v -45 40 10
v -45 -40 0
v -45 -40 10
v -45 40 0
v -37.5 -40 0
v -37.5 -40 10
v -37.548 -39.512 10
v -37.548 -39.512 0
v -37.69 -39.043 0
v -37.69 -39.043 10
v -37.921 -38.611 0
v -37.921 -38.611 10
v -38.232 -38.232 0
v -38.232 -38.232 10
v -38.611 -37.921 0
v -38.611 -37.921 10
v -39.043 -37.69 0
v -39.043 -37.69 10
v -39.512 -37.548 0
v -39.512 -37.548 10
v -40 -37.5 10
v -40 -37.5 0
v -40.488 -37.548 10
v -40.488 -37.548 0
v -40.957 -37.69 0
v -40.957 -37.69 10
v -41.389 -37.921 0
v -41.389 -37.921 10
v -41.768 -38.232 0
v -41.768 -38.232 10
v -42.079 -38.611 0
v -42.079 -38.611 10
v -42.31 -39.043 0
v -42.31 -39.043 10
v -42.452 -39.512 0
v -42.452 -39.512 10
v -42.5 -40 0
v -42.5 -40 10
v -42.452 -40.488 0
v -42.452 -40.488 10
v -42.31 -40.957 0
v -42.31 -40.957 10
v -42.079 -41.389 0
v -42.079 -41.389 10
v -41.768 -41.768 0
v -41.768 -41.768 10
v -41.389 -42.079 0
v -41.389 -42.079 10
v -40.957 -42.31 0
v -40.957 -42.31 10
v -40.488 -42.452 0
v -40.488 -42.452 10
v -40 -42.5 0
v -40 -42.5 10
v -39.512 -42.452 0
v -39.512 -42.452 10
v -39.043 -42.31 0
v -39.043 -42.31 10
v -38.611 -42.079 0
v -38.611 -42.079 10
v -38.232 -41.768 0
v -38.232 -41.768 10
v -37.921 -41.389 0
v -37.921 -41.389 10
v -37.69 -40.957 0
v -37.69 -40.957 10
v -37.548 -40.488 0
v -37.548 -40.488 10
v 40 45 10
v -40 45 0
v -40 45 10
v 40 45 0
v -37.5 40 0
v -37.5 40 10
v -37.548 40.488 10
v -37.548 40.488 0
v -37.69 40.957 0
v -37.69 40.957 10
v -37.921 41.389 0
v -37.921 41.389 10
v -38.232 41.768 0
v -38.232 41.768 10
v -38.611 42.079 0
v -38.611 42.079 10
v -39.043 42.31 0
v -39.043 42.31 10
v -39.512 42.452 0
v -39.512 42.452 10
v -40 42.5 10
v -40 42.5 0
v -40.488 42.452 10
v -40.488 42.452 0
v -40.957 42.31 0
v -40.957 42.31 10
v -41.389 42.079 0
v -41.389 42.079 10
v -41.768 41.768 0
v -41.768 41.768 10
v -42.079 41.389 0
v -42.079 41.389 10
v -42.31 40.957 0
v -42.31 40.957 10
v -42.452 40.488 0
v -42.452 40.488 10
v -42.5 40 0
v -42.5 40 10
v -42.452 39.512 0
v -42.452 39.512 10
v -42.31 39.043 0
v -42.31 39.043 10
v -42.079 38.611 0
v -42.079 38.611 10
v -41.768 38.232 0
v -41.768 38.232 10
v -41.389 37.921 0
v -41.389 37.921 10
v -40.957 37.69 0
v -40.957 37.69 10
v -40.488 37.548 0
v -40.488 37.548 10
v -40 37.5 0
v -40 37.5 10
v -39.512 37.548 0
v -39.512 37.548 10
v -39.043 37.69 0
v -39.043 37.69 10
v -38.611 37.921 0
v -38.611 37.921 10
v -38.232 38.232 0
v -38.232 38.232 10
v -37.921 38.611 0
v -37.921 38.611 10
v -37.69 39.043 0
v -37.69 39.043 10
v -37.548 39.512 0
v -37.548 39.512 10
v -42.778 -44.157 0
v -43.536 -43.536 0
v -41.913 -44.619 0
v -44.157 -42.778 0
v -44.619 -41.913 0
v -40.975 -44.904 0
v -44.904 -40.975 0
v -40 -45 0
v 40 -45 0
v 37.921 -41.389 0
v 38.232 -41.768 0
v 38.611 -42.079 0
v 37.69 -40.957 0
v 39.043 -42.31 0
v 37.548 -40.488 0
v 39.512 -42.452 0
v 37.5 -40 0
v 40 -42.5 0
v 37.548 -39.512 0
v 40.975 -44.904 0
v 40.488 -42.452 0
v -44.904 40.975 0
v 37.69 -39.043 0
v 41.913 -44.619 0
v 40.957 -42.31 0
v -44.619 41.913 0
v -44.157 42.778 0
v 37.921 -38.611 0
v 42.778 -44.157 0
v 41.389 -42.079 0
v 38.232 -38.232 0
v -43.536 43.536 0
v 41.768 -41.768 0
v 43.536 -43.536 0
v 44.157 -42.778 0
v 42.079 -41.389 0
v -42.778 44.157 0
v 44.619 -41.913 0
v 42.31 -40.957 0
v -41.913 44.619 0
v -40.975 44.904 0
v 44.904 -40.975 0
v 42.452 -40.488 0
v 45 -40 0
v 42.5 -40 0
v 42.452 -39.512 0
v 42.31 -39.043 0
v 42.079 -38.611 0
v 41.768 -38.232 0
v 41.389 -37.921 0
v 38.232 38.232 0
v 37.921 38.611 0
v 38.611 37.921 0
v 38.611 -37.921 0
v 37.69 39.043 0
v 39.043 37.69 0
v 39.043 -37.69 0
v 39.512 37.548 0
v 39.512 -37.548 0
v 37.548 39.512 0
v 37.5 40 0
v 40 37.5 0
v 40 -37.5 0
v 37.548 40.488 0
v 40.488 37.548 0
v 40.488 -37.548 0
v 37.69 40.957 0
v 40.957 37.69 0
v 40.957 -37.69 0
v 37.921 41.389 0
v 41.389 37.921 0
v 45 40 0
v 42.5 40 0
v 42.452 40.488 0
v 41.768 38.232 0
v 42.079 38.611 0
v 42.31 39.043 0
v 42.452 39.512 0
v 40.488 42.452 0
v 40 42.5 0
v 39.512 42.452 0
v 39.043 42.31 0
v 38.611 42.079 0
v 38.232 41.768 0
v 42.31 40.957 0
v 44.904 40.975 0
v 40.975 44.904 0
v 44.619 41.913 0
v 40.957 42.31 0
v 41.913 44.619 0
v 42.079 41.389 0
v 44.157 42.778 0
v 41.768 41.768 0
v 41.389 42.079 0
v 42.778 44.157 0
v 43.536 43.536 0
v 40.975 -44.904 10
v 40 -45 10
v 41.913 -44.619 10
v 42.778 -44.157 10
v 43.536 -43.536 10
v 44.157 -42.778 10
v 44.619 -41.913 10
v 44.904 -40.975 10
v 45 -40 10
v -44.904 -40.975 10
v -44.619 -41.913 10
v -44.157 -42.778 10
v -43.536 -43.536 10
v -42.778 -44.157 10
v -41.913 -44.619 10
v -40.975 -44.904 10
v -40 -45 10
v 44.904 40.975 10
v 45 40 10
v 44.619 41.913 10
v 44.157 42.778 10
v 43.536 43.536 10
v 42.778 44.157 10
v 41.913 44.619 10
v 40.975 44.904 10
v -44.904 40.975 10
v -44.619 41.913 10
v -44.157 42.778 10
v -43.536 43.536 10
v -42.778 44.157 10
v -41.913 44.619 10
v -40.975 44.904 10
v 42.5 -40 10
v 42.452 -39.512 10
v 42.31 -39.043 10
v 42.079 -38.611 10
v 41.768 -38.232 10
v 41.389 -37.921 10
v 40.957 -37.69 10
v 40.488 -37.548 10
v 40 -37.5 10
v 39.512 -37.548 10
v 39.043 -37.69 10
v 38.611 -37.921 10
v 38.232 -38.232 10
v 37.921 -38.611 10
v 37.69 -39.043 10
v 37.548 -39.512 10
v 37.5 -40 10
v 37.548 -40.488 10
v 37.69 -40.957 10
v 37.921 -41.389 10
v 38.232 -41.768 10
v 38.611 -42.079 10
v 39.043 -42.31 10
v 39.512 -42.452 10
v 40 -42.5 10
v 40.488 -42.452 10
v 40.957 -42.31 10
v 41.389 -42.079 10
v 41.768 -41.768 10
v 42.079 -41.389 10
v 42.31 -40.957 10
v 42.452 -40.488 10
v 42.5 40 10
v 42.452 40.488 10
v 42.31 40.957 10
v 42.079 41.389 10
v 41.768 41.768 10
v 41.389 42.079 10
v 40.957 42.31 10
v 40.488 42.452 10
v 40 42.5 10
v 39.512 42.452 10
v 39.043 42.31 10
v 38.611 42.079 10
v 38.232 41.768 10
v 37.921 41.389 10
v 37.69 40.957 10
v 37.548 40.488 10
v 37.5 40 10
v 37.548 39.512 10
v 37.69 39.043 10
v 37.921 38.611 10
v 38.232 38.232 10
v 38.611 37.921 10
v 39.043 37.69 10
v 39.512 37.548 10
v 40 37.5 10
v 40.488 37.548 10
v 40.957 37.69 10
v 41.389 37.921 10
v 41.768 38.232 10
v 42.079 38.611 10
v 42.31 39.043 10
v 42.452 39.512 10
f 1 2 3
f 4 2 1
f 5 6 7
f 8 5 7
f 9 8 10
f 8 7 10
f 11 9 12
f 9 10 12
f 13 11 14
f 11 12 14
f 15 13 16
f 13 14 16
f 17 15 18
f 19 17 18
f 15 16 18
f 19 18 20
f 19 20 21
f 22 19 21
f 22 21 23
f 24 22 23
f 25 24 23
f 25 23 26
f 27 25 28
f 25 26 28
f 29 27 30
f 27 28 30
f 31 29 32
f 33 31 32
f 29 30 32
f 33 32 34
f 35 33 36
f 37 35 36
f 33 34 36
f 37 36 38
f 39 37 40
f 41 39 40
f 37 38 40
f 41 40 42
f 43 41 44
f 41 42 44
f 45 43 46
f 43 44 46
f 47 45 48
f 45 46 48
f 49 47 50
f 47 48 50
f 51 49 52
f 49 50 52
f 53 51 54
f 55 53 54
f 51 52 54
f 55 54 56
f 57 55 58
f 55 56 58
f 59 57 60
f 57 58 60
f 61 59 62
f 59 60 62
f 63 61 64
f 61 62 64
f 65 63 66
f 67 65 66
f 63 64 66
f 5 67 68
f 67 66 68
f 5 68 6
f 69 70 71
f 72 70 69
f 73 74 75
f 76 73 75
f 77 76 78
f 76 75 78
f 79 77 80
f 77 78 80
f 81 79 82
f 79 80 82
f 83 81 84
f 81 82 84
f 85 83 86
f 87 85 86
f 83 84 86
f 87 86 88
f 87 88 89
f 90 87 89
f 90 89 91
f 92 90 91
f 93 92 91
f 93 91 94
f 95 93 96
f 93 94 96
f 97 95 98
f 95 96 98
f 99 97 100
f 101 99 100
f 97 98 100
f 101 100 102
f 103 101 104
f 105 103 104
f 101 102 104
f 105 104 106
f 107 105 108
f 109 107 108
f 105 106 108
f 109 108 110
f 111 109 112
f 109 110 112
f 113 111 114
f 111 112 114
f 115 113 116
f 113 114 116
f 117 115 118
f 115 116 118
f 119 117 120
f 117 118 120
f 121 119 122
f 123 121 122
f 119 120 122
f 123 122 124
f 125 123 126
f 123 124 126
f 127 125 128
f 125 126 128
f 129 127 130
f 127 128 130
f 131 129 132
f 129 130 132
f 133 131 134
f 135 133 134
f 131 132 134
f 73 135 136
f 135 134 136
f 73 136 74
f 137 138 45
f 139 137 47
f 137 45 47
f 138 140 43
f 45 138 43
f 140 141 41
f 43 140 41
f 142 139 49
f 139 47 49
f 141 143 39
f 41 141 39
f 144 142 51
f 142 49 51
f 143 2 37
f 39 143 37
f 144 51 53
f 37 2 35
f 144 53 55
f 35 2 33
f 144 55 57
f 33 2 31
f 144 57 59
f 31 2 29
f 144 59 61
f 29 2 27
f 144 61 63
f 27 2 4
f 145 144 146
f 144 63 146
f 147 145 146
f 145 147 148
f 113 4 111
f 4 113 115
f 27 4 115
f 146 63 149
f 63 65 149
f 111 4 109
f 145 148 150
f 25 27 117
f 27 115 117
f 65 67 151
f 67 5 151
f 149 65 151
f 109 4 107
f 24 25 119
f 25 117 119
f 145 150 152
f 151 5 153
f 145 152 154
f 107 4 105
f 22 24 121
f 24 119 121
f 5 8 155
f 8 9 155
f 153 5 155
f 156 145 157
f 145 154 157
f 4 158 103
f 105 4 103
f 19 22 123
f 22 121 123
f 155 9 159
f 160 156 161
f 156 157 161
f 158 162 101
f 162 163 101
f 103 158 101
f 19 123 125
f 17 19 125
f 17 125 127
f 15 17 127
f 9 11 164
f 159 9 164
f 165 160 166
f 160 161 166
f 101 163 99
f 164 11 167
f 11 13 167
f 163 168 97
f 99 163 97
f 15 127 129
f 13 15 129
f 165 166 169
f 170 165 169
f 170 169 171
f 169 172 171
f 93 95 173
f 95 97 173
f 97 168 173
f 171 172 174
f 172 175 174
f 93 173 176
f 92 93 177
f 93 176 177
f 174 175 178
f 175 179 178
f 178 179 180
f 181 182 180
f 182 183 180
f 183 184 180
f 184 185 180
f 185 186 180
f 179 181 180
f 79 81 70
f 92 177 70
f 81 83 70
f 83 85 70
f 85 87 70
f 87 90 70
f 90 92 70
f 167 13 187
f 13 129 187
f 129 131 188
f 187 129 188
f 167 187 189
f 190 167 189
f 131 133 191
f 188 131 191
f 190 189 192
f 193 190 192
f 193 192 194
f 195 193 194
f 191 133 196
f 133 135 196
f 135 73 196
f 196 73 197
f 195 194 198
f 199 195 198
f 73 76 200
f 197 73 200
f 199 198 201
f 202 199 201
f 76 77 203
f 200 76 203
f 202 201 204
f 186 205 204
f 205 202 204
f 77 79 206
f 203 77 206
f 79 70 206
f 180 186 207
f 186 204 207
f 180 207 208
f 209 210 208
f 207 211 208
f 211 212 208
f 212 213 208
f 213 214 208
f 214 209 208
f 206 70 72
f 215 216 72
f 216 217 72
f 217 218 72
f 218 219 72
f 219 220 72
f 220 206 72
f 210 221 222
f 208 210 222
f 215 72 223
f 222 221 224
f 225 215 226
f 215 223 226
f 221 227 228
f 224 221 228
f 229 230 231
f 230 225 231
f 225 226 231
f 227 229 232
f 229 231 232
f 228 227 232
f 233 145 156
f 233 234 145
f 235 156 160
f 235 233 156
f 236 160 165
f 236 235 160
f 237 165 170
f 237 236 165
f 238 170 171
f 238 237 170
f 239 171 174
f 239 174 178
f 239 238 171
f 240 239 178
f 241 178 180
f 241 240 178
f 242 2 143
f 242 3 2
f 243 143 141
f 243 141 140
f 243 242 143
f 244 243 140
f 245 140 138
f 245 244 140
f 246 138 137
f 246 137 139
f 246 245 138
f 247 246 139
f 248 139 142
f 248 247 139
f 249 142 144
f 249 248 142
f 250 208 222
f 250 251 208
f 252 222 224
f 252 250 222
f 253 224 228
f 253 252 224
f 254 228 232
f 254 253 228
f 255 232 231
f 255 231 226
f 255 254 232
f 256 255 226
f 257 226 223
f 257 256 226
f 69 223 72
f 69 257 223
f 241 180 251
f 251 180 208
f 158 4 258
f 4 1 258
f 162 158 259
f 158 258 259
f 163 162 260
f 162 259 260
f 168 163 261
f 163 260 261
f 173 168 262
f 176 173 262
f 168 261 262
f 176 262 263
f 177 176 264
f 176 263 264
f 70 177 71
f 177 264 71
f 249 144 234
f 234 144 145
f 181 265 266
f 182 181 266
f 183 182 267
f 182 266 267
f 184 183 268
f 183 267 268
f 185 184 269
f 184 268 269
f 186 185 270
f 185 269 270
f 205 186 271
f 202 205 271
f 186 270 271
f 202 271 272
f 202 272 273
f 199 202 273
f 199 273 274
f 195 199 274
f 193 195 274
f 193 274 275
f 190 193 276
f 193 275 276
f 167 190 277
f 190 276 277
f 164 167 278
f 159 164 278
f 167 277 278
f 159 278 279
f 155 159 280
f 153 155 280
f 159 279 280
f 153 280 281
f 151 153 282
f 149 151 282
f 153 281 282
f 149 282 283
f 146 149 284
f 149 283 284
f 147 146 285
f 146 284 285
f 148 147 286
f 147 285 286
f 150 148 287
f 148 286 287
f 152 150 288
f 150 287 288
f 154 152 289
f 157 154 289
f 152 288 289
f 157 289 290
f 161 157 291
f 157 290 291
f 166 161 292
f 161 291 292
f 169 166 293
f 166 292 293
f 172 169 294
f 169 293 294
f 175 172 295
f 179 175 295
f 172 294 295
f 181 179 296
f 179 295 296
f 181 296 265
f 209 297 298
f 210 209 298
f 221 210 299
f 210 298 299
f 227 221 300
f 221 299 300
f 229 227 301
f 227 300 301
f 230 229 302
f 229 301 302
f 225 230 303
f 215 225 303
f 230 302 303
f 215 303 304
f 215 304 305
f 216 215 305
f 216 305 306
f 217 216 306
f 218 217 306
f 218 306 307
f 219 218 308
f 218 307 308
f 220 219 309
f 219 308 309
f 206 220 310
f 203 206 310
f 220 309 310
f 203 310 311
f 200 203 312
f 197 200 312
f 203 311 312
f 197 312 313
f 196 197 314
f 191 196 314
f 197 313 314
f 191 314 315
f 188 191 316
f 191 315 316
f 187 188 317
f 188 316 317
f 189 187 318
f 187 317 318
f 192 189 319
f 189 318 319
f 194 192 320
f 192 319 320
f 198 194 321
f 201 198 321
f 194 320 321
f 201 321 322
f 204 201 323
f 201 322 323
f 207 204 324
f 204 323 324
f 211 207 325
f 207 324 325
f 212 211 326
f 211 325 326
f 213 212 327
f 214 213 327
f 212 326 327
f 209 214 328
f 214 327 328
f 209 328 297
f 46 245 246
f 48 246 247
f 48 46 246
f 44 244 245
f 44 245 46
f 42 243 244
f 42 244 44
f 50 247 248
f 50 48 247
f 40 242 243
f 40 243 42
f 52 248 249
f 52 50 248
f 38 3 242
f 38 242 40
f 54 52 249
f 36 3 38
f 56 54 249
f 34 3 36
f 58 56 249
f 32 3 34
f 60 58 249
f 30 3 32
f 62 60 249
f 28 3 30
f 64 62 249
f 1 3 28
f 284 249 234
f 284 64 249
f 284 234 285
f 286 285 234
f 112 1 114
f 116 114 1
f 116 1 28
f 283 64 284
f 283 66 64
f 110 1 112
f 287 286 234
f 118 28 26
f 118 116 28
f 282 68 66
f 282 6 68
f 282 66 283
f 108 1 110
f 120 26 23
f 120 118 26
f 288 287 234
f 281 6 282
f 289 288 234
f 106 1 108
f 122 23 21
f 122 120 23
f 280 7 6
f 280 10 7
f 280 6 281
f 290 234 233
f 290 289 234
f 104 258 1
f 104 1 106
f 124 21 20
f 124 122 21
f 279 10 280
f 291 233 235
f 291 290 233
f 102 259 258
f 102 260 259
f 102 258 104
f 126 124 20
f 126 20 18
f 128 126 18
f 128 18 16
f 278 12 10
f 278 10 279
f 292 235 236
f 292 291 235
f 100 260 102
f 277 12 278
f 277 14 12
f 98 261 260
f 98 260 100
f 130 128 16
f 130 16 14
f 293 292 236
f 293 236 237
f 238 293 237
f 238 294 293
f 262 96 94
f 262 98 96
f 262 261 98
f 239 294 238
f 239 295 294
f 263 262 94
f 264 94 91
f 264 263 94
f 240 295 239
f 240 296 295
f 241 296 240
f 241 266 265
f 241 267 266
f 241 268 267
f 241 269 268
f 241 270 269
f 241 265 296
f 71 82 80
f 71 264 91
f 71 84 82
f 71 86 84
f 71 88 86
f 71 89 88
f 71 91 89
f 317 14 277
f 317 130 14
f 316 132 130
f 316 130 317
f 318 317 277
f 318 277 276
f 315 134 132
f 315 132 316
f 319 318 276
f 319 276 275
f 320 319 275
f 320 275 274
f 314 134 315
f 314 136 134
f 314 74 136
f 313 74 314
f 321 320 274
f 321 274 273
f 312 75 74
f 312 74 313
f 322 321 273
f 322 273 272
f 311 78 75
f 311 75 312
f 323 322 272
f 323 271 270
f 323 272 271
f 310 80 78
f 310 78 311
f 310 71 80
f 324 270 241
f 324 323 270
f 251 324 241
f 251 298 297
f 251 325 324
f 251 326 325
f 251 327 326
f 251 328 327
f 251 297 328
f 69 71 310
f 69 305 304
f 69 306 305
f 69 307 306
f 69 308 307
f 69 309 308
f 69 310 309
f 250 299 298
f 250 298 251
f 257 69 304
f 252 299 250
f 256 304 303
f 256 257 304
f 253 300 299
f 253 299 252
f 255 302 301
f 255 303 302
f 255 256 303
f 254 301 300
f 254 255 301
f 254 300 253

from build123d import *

# Parameters (mm, degrees)
SKETCH1_W           = 90
SKETCH1_H           = 90
BOSS_EXTRUDE1_DEPTH = 10
FILLET1_R           = 5
SKETCH2_R           = 2.5
CUT_EXTRUDE1_DEPTH  = 10


with BuildPart() as part:
    # Sketch1 → Boss-Extrude1 (new body)
    with BuildSketch(Plane.XY):
        Rectangle(SKETCH1_W, SKETCH1_H)
    extrude(amount=BOSS_EXTRUDE1_DEPTH)

    # Fillet1
    fillet1_edges = [part.edges().sort_by_distance(p)[0] for p in [
        (45, -45, 5),
        (-45, -45, 5),
        (-45, 45, 5),
        (45, 45, 5),
    ]]
    fillet(fillet1_edges, radius=FILLET1_R)

    # Sketch2 → Cut-Extrude1 (cut)
    with BuildSketch(Plane.XY.offset(10)):
        with Locations((-40, 40)):
            Circle(SKETCH2_R)
        with Locations((40, 40)):
            Circle(SKETCH2_R)
        with Locations((40, -40)):
            Circle(SKETCH2_R)
        with Locations((-40, -40)):
            Circle(SKETCH2_R)
    extrude(amount=-CUT_EXTRUDE1_DEPTH, mode=Mode.SUBTRACT)


solid = part.part
